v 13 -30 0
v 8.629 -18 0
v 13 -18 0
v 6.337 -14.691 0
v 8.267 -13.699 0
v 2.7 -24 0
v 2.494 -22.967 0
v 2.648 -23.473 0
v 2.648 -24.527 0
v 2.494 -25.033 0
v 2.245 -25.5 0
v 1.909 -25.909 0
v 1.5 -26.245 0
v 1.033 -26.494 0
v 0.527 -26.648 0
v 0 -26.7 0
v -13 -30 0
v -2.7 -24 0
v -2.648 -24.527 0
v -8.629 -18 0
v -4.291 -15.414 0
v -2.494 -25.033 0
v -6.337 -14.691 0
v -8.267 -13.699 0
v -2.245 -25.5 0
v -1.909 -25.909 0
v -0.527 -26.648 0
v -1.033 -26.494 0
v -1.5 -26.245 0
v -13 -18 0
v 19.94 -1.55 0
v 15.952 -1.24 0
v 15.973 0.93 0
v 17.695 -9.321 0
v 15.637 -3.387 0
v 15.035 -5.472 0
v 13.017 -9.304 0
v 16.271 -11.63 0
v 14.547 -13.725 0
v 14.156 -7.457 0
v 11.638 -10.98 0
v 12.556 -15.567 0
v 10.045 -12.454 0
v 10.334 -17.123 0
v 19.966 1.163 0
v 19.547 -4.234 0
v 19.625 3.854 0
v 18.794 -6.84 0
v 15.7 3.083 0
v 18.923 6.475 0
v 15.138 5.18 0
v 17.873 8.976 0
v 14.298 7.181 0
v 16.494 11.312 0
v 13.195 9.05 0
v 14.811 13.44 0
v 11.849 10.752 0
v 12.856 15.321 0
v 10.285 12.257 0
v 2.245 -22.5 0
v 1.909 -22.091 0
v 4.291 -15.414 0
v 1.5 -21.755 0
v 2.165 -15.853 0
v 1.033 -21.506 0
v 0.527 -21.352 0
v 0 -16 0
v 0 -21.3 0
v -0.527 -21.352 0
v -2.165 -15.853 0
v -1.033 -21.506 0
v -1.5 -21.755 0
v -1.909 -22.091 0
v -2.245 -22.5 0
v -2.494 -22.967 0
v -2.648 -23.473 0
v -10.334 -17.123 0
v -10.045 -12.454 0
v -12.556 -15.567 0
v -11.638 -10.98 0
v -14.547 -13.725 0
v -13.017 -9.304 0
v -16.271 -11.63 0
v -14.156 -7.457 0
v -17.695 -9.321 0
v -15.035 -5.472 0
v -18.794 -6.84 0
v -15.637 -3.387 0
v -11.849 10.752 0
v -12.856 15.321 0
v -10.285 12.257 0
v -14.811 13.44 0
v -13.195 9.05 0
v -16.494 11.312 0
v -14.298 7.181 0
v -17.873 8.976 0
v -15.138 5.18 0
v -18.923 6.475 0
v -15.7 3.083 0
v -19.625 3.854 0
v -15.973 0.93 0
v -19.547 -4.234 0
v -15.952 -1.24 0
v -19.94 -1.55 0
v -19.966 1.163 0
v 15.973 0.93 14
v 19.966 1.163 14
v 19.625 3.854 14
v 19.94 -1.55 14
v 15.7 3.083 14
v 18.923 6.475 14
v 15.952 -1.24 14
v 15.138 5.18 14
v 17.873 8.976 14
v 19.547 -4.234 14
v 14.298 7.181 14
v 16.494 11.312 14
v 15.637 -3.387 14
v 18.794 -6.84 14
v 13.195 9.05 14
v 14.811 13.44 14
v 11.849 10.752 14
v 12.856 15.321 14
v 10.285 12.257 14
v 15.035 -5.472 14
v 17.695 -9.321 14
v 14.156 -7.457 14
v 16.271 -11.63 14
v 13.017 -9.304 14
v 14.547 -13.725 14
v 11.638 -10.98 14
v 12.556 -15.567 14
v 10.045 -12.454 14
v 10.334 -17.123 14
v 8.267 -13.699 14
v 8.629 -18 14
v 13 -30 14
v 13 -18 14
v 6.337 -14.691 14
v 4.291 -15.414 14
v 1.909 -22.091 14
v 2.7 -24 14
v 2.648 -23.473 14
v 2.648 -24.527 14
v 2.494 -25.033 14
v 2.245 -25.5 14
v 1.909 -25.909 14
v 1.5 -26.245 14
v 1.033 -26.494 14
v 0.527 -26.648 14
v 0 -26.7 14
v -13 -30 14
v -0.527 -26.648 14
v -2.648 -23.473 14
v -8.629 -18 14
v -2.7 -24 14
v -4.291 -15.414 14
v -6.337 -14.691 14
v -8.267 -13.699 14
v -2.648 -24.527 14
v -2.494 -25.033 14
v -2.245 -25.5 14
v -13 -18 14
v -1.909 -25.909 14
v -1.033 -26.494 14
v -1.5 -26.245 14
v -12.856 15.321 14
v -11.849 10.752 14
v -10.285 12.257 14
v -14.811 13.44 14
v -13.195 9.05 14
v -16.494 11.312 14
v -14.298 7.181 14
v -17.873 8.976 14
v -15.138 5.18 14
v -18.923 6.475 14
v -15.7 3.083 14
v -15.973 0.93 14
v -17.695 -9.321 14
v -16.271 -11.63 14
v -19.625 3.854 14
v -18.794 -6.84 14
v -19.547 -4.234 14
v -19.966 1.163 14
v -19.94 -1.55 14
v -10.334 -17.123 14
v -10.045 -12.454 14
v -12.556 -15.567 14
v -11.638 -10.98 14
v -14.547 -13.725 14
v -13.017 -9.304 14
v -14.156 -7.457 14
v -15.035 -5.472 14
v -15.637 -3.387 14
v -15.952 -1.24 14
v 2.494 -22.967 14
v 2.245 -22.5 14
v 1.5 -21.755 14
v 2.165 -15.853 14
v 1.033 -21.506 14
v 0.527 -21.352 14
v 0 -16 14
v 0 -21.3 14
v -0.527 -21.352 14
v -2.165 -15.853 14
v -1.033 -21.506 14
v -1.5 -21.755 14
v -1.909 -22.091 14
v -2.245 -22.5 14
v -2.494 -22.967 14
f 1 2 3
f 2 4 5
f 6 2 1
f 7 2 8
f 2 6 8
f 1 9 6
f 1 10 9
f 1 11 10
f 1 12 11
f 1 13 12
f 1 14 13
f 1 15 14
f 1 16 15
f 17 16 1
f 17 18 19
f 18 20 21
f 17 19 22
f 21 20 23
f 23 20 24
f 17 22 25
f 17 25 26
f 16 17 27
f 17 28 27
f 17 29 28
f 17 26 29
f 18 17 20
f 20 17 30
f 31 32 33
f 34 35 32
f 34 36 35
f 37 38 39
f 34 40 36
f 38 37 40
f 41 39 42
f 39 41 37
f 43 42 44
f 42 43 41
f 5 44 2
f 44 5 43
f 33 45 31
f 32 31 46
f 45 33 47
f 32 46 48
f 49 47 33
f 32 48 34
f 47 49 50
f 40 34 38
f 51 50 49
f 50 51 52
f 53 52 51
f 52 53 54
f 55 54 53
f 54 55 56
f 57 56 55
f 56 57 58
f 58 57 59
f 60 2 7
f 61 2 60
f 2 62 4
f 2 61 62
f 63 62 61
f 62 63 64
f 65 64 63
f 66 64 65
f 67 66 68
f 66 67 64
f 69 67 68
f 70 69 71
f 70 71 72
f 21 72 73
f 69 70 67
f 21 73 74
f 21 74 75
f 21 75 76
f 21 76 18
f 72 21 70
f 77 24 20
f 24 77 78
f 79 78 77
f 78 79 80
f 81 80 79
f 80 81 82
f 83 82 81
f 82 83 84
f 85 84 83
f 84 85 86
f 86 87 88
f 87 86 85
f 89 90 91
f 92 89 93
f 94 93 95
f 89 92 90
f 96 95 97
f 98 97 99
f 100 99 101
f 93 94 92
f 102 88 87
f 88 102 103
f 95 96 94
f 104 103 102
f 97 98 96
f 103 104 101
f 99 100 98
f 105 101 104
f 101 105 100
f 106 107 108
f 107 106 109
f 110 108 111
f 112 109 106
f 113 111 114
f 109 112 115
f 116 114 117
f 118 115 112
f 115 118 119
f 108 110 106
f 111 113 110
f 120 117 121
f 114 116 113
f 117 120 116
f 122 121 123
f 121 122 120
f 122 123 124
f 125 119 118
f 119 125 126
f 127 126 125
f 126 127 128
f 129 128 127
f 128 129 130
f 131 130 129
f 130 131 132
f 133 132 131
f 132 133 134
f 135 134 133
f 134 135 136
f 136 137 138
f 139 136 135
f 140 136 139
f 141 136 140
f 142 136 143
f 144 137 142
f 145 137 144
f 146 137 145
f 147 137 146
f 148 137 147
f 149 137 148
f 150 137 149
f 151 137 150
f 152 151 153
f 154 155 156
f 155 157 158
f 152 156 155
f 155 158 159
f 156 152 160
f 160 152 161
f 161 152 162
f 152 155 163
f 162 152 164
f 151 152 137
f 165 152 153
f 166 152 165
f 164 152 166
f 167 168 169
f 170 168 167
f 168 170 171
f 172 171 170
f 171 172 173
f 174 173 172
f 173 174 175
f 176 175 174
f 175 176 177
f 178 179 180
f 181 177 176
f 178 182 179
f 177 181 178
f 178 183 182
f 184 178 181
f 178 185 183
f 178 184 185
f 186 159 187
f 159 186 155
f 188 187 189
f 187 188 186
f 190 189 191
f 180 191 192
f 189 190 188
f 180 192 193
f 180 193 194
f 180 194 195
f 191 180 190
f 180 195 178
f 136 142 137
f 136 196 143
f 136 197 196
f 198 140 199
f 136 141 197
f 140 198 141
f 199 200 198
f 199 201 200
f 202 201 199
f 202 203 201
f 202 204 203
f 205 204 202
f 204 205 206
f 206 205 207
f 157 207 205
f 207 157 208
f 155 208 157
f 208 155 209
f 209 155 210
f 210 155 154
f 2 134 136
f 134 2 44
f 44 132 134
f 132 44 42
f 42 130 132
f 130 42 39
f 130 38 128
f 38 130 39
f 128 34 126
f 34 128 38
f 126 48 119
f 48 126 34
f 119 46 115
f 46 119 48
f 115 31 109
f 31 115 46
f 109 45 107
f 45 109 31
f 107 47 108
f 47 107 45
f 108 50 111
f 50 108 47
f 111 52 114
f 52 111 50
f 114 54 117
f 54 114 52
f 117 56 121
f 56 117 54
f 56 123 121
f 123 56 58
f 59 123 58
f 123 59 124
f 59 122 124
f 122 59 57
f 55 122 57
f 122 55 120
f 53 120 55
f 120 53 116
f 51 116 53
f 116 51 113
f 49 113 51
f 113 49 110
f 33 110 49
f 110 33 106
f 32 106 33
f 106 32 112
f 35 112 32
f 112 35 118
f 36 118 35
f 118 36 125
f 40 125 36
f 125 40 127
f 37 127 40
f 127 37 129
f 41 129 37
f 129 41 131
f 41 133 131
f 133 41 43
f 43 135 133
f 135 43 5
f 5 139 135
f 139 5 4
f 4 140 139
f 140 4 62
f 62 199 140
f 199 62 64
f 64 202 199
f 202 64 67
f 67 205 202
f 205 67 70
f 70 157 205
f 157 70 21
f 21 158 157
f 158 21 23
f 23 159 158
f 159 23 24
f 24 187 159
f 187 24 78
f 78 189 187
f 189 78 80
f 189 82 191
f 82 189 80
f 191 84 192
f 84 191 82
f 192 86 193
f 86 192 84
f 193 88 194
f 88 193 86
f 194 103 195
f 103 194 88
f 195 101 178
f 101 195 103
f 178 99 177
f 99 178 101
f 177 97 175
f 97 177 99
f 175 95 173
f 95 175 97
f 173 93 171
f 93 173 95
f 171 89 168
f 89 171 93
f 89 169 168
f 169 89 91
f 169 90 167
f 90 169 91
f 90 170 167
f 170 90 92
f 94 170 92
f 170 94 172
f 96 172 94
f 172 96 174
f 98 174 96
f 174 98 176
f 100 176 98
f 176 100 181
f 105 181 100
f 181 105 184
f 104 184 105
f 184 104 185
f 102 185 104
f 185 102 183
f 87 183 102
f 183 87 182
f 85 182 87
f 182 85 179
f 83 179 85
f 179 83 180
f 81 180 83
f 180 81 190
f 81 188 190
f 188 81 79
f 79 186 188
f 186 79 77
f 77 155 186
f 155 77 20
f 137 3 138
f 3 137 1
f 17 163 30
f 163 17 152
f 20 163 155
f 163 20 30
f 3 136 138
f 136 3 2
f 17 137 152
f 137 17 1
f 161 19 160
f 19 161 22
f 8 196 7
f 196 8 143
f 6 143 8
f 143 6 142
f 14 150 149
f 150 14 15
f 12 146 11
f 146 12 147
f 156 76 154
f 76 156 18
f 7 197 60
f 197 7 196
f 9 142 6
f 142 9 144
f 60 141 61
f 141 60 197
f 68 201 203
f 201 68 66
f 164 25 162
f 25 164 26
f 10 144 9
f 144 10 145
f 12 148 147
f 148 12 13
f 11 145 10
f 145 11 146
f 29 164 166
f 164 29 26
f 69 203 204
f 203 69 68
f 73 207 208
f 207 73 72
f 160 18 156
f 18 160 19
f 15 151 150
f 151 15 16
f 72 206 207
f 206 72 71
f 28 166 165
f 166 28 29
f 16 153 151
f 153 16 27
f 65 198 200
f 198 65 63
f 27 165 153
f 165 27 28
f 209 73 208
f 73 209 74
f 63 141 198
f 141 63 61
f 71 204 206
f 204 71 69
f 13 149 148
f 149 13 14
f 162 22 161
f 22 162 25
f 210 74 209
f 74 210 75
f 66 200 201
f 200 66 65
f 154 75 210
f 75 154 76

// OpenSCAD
$fn = 32;

// ----------------------------------------------------------------------
// Spring clip: 40 mm outside, 4 mm band, 80 degree opening
// ----------------------------------------------------------------------

// --- parameters (mm) ---
outer_r = 20;             // clip outside radius
inner_r = 16;             // clip bore radius
band = 4;                 // band thickness
clip_w = 14;              // clip width
opening = 80;             // opening angle
tab_w = 26;               // tab width
tab_len = 10;             // tab length past the clip
tab_hole = 5.4;           // tab fixing hole

clip_profile = [[-12.856, 15.321], [-14.811, 13.44], [-16.494, 11.312], [-17.873, 8.976], [-18.923, 6.475], [-19.625, 3.854], [-19.966, 1.163], [-19.94, -1.55], [-19.547, -4.234], [-18.794, -6.84], [-17.695, -9.321], [-16.271, -11.63], [-14.547, -13.725], [-12.556, -15.567], [-10.334, -17.123], [-7.922, -18.364], [-5.363, -19.267], [-2.707, -19.816], [0, -20], [2.707, -19.816], [5.363, -19.267], [7.922, -18.364], [10.334, -17.123], [12.556, -15.567], [14.547, -13.725], [16.271, -11.63], [17.695, -9.321], [18.794, -6.84], [19.547, -4.234], [19.94, -1.55], [19.966, 1.163], [19.625, 3.854], [18.923, 6.475], [17.873, 8.976], [16.494, 11.312], [14.811, 13.44], [12.856, 15.321], [10.285, 12.257], [11.849, 10.752], [13.195, 9.05], [14.298, 7.181], [15.138, 5.18], [15.7, 3.083], [15.973, 0.93], [15.952, -1.24], [15.637, -3.387], [15.035, -5.472], [14.156, -7.457], [13.017, -9.304], [11.638, -10.98], [10.045, -12.454], [8.267, -13.699], [6.337, -14.691], [4.291, -15.414], [2.165, -15.853], [0, -16], [-2.165, -15.853], [-4.291, -15.414], [-6.337, -14.691], [-8.267, -13.699], [-10.045, -12.454], [-11.638, -10.98], [-13.017, -9.304], [-14.156, -7.457], [-15.035, -5.472], [-15.637, -3.387], [-15.952, -1.24], [-15.973, 0.93], [-15.7, 3.083], [-15.138, 5.18], [-14.298, 7.181], [-13.195, 9.05], [-11.849, 10.752], [-10.285, 12.257]];

difference() {
  union() {
    linear_extrude(height = clip_w) polygon(clip_profile);
    /* mounting tab, sunk 2 mm into the band */
    translate([-13, -30, 0]) cube([tab_w, 12, clip_w]);
  }
  translate([0, -24, -2.5]) cylinder(h = clip_w + 5, d = tab_hole);
}
